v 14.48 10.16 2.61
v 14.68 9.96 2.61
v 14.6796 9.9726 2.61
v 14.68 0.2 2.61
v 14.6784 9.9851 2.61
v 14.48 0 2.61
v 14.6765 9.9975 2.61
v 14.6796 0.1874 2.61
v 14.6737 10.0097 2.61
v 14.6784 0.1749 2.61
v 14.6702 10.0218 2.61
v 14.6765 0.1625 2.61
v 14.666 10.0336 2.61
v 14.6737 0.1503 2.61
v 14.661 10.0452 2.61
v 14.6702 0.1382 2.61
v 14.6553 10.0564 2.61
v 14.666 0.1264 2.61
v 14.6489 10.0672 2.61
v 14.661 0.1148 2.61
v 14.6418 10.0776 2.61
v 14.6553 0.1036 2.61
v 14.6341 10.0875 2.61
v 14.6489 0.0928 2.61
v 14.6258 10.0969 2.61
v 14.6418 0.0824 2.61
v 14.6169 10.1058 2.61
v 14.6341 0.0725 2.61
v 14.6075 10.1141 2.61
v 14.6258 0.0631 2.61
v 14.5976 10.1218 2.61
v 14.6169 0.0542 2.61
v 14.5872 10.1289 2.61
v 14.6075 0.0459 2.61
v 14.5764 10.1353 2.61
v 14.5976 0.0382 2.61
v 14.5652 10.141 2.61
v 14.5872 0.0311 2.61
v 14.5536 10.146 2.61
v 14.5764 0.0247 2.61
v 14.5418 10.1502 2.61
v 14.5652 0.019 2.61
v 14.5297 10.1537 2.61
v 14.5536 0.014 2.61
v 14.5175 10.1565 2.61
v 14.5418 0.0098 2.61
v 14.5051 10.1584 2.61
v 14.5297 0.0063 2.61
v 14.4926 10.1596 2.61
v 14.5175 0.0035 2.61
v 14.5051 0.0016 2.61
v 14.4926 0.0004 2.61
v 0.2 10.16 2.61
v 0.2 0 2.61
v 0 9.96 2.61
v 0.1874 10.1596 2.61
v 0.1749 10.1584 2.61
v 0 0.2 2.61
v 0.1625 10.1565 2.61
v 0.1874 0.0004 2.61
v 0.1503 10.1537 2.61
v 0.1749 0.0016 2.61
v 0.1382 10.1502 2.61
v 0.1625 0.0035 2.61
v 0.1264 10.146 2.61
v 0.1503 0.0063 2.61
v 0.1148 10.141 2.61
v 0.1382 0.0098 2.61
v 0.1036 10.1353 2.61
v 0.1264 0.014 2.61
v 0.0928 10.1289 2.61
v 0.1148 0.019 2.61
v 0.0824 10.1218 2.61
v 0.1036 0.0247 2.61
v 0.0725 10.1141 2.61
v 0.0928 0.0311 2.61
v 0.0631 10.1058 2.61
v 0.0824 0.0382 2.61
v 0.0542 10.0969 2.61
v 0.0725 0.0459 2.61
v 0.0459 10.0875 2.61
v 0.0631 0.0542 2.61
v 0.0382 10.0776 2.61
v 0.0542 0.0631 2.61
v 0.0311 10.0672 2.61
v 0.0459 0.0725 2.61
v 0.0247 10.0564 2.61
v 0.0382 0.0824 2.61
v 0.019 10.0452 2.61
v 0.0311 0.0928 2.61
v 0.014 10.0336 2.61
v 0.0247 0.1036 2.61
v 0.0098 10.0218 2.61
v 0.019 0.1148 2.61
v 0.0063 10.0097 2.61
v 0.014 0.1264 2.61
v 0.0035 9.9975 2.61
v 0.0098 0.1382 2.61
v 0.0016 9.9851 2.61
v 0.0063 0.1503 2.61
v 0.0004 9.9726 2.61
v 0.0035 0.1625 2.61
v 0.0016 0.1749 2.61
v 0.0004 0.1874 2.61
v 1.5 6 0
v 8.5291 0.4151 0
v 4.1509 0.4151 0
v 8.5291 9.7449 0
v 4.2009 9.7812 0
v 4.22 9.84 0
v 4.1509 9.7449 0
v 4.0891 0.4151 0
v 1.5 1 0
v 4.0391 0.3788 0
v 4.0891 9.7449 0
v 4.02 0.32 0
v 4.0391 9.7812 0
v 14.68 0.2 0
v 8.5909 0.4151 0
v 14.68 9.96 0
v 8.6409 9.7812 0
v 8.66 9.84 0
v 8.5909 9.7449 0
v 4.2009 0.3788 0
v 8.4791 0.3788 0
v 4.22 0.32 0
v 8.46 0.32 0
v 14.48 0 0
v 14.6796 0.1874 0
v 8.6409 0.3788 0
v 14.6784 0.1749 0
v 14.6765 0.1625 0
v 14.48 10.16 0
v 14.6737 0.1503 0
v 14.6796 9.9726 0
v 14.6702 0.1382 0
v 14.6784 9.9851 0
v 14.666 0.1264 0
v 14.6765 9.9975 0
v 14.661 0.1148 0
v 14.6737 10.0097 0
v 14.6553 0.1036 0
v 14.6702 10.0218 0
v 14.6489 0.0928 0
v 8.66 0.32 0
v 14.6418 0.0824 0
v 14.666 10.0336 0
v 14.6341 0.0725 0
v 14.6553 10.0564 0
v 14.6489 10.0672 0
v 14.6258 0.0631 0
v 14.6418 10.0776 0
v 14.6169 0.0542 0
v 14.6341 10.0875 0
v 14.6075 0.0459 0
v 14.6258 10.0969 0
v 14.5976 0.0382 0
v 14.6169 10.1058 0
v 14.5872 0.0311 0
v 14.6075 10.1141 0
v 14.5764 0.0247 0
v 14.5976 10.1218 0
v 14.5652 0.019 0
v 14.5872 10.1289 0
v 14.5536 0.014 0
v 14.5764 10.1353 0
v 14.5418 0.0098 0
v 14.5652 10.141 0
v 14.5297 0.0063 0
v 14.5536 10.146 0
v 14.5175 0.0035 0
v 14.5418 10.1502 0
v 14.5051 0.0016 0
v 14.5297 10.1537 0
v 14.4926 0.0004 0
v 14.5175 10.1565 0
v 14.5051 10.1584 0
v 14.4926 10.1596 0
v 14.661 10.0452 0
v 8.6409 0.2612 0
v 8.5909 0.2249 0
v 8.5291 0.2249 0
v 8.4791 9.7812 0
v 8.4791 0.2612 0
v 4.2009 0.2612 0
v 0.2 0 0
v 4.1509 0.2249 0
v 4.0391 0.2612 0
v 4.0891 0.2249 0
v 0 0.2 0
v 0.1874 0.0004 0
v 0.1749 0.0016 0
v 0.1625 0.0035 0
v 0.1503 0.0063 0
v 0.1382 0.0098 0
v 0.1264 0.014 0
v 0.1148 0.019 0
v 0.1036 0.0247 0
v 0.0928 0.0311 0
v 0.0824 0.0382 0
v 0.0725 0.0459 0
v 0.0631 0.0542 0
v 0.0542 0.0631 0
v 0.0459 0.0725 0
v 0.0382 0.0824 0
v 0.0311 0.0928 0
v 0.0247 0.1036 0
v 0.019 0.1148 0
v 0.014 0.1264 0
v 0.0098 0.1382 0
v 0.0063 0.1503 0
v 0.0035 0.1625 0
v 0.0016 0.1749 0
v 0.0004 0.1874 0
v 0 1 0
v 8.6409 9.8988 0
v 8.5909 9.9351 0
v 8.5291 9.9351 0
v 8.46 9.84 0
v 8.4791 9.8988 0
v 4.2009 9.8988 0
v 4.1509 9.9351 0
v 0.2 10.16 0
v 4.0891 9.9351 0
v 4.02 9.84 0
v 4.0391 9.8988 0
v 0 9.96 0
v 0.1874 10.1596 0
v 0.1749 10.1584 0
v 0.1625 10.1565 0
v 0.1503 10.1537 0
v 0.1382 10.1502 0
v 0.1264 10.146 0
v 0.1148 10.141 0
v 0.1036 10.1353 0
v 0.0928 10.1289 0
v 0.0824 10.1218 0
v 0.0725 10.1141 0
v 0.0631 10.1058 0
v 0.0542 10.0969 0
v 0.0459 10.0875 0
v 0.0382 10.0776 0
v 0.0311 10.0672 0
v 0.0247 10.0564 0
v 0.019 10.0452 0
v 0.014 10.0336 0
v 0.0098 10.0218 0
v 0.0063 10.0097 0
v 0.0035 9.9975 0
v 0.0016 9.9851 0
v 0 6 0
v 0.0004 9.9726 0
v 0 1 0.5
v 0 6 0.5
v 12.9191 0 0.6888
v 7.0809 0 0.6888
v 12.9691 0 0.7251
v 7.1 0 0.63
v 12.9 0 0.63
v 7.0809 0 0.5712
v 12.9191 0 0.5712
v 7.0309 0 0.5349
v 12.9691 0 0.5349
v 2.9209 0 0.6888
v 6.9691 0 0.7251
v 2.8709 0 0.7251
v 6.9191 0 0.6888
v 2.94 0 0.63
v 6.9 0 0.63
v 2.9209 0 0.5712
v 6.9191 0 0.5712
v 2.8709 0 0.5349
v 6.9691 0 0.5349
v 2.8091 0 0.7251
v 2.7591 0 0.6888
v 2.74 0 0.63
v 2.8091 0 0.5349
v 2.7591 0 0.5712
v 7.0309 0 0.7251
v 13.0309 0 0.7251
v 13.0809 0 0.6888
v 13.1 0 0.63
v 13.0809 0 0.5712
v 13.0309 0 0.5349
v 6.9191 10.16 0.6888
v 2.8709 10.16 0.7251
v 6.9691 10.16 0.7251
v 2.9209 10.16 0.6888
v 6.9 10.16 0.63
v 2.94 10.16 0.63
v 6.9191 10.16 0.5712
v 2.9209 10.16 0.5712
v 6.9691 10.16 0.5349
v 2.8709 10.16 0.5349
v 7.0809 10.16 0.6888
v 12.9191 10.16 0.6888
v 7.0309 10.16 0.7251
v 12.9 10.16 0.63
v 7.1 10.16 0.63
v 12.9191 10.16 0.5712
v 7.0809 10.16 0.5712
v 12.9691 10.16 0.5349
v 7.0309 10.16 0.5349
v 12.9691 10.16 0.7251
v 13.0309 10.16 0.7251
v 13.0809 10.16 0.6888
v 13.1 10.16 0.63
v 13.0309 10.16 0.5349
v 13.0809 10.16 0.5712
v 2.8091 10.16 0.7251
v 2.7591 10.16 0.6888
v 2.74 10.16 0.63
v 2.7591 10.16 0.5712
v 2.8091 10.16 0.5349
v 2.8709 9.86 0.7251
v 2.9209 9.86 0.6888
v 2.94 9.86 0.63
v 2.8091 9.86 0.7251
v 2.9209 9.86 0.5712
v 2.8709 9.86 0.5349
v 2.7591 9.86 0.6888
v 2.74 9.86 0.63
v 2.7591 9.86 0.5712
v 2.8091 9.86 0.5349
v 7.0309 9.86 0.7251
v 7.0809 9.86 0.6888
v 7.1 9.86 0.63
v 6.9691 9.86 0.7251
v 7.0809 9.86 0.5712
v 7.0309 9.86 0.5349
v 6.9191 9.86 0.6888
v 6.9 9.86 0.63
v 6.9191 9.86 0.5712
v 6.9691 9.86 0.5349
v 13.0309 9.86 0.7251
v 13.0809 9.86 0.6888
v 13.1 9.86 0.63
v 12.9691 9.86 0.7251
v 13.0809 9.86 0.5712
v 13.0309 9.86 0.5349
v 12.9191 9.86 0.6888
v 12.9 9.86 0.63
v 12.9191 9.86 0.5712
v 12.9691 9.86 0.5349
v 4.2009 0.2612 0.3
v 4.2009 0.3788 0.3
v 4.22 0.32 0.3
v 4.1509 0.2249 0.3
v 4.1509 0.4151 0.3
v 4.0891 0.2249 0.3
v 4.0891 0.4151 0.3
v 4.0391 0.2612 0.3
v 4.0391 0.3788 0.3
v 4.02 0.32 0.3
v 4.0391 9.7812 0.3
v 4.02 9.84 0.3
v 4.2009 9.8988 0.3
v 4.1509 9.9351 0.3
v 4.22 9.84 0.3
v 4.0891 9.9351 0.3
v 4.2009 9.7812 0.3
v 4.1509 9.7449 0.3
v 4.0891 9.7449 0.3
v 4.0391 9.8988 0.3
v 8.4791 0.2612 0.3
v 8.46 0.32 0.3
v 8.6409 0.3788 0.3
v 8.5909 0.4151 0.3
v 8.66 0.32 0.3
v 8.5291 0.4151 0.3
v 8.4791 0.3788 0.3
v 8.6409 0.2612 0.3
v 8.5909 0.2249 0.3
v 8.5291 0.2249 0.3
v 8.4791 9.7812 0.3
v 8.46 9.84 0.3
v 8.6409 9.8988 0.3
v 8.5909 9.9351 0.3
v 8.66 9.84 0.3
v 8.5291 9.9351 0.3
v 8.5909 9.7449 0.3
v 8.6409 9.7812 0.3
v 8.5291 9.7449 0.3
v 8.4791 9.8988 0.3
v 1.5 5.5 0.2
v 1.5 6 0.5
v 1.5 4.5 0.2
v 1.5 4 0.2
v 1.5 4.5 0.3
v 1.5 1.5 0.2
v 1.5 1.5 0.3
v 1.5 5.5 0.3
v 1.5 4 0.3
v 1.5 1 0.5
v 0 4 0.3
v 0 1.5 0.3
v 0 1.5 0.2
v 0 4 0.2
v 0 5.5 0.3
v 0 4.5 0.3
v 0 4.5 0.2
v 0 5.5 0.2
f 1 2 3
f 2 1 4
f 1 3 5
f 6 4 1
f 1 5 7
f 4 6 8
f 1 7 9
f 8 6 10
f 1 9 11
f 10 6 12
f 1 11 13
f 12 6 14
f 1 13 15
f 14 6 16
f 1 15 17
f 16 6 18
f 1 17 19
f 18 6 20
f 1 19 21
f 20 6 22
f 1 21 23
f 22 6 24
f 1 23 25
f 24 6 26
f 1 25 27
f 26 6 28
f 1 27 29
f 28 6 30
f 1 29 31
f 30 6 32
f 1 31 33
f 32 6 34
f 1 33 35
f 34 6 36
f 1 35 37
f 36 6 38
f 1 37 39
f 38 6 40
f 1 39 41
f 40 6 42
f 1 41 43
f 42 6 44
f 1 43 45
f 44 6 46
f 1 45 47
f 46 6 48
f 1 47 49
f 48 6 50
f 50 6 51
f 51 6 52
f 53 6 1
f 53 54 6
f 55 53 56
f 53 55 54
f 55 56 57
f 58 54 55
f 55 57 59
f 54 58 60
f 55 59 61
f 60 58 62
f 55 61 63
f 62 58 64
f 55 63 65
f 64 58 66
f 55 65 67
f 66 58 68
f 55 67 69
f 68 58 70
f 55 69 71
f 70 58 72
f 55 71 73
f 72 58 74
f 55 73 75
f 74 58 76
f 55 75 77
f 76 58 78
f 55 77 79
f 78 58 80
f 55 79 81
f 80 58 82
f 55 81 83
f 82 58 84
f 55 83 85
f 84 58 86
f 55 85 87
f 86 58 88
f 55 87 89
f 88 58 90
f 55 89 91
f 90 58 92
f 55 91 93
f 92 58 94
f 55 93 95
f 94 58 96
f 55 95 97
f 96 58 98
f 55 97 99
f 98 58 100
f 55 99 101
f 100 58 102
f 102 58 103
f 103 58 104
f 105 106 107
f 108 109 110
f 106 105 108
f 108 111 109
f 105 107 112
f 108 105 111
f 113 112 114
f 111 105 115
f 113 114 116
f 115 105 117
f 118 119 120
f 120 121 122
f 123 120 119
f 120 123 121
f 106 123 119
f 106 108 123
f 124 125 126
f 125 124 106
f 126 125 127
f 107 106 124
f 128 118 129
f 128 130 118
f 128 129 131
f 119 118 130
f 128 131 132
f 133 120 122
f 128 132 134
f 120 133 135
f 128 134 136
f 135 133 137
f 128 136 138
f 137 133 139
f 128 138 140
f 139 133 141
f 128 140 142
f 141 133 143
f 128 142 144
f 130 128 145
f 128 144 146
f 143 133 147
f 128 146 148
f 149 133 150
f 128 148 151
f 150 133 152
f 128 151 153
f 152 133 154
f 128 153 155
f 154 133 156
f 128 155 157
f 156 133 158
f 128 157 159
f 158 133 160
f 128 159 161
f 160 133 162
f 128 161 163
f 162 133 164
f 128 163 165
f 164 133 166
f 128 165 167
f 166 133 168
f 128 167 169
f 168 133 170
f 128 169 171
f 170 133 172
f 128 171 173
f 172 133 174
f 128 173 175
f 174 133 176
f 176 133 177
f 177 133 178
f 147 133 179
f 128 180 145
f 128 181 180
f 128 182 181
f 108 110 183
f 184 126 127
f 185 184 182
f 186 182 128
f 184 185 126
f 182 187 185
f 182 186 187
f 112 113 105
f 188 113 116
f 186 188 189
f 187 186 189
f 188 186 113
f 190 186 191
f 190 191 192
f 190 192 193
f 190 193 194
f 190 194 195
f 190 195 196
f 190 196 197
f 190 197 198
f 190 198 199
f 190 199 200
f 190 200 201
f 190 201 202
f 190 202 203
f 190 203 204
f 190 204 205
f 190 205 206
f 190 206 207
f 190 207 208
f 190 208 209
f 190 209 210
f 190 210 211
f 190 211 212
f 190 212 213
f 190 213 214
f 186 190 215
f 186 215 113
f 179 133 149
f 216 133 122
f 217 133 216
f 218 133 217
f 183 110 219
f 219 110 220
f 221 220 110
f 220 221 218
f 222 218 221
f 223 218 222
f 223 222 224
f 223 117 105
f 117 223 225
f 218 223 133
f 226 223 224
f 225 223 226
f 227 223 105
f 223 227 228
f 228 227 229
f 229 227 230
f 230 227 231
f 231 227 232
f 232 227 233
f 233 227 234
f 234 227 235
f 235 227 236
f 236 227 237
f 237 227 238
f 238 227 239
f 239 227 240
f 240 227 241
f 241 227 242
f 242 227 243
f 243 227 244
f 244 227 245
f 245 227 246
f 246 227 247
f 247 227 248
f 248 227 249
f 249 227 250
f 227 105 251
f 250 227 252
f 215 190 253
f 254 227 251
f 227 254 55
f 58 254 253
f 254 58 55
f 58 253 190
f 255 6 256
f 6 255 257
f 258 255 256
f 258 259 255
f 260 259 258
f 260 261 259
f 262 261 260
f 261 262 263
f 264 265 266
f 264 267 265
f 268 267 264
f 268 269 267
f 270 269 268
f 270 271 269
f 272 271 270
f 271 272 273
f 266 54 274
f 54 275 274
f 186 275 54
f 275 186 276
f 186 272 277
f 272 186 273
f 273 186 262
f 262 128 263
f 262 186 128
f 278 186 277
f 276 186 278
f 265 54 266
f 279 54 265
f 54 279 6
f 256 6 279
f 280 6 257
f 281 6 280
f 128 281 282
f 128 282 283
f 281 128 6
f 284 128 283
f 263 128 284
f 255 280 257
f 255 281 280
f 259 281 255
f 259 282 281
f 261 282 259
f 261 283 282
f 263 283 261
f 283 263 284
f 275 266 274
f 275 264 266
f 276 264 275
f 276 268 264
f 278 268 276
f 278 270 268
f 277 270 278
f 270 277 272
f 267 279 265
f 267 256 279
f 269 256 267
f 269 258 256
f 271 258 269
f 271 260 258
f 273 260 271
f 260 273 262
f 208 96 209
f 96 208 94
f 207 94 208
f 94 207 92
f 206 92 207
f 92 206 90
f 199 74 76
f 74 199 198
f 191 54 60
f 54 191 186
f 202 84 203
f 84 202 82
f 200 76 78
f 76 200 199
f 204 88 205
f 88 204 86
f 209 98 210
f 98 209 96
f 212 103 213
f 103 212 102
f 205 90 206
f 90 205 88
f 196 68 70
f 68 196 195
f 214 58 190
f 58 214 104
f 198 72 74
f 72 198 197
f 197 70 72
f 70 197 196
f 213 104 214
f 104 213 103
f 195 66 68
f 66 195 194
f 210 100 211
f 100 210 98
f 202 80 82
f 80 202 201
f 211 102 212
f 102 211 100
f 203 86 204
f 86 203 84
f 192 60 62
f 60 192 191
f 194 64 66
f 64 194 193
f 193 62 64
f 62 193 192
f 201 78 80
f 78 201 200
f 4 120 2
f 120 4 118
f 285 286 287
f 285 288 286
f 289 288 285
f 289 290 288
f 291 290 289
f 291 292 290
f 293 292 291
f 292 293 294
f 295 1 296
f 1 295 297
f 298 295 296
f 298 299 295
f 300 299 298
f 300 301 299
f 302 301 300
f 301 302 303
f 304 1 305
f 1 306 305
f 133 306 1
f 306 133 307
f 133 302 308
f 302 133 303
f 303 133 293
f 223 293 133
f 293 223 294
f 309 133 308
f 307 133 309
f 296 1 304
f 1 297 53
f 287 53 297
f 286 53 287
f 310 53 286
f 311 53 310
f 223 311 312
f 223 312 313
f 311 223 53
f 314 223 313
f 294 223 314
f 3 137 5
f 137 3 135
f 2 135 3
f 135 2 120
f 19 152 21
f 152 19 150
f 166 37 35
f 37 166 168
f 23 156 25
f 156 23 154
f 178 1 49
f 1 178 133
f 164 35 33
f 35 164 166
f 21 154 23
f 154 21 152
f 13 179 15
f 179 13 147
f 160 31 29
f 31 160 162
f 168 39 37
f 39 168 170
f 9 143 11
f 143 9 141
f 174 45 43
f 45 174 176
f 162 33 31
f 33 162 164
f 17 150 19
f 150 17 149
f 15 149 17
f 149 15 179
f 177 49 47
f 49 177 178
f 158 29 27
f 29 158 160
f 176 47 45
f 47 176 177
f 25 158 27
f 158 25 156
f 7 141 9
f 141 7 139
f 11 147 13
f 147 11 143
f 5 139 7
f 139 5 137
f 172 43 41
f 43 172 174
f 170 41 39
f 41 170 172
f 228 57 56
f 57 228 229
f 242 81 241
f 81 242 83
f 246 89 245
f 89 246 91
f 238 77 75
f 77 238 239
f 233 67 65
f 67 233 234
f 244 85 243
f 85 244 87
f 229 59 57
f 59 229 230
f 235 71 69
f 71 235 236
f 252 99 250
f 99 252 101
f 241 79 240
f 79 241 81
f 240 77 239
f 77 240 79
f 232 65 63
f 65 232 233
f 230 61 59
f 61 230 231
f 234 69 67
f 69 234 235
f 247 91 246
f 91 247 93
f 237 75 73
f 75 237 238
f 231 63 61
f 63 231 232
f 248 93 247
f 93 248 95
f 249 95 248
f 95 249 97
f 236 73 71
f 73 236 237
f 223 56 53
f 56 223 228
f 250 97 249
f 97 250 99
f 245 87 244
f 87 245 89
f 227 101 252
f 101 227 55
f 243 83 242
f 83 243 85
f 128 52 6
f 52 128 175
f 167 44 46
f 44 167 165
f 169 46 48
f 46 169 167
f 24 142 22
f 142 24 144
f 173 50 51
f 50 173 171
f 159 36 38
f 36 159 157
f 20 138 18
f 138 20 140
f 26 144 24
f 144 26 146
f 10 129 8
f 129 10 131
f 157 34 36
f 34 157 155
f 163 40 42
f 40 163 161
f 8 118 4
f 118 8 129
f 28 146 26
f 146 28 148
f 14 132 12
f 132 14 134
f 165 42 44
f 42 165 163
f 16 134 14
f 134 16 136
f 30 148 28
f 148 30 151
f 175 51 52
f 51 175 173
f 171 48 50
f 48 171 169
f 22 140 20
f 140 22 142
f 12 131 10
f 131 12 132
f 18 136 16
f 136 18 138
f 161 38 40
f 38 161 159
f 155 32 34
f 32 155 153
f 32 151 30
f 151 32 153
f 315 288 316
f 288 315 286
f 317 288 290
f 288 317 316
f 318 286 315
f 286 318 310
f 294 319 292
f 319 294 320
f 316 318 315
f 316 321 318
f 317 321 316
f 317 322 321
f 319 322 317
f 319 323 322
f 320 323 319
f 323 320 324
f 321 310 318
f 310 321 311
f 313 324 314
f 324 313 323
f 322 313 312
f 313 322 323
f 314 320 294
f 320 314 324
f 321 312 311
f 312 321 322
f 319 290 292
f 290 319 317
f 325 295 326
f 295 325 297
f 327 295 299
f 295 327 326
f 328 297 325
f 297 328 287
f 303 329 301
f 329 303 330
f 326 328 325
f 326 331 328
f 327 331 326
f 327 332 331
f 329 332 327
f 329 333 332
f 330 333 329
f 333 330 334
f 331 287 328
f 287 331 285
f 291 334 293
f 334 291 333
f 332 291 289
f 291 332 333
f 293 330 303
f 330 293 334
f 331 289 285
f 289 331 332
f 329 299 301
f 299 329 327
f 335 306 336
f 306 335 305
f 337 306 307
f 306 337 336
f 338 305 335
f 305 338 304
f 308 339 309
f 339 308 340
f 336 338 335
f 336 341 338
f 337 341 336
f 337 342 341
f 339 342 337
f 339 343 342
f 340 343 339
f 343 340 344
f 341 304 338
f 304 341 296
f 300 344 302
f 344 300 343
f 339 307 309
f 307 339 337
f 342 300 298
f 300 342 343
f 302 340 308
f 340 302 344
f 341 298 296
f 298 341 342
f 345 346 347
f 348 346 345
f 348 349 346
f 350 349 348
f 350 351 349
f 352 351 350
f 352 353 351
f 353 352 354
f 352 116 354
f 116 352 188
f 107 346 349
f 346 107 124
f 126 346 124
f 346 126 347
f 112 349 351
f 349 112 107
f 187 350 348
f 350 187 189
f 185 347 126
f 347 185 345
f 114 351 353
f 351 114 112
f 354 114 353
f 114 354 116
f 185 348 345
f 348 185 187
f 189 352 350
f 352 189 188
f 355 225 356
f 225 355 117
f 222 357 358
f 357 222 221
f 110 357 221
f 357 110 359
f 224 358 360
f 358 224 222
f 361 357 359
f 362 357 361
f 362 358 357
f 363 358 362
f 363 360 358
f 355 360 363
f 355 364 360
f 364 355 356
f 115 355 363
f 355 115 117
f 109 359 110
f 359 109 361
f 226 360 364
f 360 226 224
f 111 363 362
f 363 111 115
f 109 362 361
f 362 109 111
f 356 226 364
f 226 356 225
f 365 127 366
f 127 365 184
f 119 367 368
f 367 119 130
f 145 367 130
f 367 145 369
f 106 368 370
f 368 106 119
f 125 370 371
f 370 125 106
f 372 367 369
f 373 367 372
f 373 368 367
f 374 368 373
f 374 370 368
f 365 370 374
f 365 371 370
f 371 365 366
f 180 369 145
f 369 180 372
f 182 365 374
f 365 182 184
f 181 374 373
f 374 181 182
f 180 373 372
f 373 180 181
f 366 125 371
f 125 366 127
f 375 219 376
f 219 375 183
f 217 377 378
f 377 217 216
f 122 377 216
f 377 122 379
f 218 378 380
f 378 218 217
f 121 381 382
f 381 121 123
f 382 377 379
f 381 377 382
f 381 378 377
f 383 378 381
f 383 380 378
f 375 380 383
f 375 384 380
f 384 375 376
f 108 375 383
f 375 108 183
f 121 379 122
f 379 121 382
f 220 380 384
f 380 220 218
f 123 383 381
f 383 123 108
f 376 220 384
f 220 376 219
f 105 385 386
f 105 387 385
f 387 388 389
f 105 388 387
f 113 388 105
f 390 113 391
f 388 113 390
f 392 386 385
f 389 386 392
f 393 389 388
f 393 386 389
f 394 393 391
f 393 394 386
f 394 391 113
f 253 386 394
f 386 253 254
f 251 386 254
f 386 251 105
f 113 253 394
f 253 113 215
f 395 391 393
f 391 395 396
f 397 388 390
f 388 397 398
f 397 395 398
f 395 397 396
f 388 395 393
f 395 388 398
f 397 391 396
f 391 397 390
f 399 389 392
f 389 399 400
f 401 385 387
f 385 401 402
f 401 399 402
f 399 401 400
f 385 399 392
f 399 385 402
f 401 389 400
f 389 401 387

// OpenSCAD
// file: include.scad
//$fs = 0.05;
$fn = 100;
//$fa = 20;

OVERLAP = 0.1;

module rounded_cuboid(dimensions, CORNER_R) {
    
    MB_L = dimensions[0];
    MB_W = dimensions[1];
    MB_H = dimensions[2];
    
    difference() {
        cube([MB_L, MB_W, MB_H]);
        difference() {
            translate([0,0,0])                              { cube([CORNER_R, CORNER_R, MB_H]);}
            translate([CORNER_R,CORNER_R,0])                { cylinder(h = MB_H, r = CORNER_R, $fs = 0.1);}
        }
        difference() {
            translate([MB_L-CORNER_R,MB_W-CORNER_R,0])      { cube([CORNER_R, CORNER_R, MB_H+1]);}
            translate([MB_L - CORNER_R,MB_W - CORNER_R,0])  { cylinder(h = MB_H, r = CORNER_R, $fs = 0.1);}
        }
        difference() {
            translate([0,MB_W-CORNER_R,0])                  { cube([CORNER_R, CORNER_R, MB_H+1]);}
            translate([CORNER_R,MB_W - CORNER_R,0])         { cylinder(h = MB_H, r = CORNER_R, $fs = 0.1);}
        }
        difference() {
            translate([MB_L-CORNER_R,0,0])                  { cube([CORNER_R, CORNER_R, MB_H+1]);}
            translate([MB_L - CORNER_R,CORNER_R,0])         { cylinder(h = MB_H, r = CORNER_R, $fs = 0.1);}
        }
    }
}
// main file
use <include.scad>

module hard_drive() {
    
    
    
    L = 14.68; // 5.782 inches
    W = 10.16; // 4.000 inches
    H = 2.61;  // 1.028 inches
    
    MOUNT_HOLE_R = 0.1;//
    MOUNT_HOLE_H = 0.3;//
    
    // side mounting holes coords
    SIDE_HOLE_1_X = 2.84;// 1.12 inches 
    SIDE_HOLE_2_X = SIDE_HOLE_1_X +  4.16;  // + 1.638 inches 
    SIDE_HOLE_3_X = SIDE_HOLE_1_X + 10.16; // + 4.000 inches 
    
    SIDE_HOLE_1_Y = 0;
    SIDE_HOLE_2_Y = W;
    
    SIDE_HOLE_Z = 0.63;// 0.250 inches
    
    // bottom mounting holes coords
    BOTT_HOLE_1_X = 4.12; // 1.625
    BOTT_HOLE_2_X = BOTT_HOLE_1_X + 4.44; // + 1.750
    
    DY = 9.52; // 3.750 - distance between bottom holes by Y / width
    BOTT_HOLE_1_Y = (W - DY) / 2;
    BOTT_HOLE_2_Y = DY + (W - DY) / 2;
    
    difference() {
        rounded_cuboid([L, W, H], 0.2); // body
        
        // side holes
        for (x_i = [SIDE_HOLE_1_X, SIDE_HOLE_2_X, SIDE_HOLE_3_X]) {
        for (y_i = [SIDE_HOLE_1_Y, SIDE_HOLE_2_Y]) {
            translate([x_i, y_i, SIDE_HOLE_Z]) {
            rotate([90, 0, 0]) {
                cylinder(h = MOUNT_HOLE_H, r = MOUNT_HOLE_R, $fn = 10);
            }}
        }}
        
        // bottom holes
        for (x_i = [BOTT_HOLE_1_X, BOTT_HOLE_2_X]) {
        for (y_i = [BOTT_HOLE_1_Y, BOTT_HOLE_2_Y]) {
            translate([x_i, y_i, 0]) {
                cylinder(h = MOUNT_HOLE_H, r = MOUNT_HOLE_R, $fn = 10);
            }
        }}
        
        // sata and power slots
        
        
        //translate([0, 5.5, 0]) {
        //    cube([1.5, 3.5, 0.5]);
        //}
        
        translate([0, 1.0, 0]) {
            cube([1.5, 5.0, 0.5]);
        }

    }
    
    // sata pins
    translate([0, 1.5, 0.2]) {
        cube([1.5, 2.5, 0.1]);
    }
    
    translate([0, 4.5, 0.2]) {
        cube([1.5, 1.0, 0.1]);
    }


}






hard_drive();
